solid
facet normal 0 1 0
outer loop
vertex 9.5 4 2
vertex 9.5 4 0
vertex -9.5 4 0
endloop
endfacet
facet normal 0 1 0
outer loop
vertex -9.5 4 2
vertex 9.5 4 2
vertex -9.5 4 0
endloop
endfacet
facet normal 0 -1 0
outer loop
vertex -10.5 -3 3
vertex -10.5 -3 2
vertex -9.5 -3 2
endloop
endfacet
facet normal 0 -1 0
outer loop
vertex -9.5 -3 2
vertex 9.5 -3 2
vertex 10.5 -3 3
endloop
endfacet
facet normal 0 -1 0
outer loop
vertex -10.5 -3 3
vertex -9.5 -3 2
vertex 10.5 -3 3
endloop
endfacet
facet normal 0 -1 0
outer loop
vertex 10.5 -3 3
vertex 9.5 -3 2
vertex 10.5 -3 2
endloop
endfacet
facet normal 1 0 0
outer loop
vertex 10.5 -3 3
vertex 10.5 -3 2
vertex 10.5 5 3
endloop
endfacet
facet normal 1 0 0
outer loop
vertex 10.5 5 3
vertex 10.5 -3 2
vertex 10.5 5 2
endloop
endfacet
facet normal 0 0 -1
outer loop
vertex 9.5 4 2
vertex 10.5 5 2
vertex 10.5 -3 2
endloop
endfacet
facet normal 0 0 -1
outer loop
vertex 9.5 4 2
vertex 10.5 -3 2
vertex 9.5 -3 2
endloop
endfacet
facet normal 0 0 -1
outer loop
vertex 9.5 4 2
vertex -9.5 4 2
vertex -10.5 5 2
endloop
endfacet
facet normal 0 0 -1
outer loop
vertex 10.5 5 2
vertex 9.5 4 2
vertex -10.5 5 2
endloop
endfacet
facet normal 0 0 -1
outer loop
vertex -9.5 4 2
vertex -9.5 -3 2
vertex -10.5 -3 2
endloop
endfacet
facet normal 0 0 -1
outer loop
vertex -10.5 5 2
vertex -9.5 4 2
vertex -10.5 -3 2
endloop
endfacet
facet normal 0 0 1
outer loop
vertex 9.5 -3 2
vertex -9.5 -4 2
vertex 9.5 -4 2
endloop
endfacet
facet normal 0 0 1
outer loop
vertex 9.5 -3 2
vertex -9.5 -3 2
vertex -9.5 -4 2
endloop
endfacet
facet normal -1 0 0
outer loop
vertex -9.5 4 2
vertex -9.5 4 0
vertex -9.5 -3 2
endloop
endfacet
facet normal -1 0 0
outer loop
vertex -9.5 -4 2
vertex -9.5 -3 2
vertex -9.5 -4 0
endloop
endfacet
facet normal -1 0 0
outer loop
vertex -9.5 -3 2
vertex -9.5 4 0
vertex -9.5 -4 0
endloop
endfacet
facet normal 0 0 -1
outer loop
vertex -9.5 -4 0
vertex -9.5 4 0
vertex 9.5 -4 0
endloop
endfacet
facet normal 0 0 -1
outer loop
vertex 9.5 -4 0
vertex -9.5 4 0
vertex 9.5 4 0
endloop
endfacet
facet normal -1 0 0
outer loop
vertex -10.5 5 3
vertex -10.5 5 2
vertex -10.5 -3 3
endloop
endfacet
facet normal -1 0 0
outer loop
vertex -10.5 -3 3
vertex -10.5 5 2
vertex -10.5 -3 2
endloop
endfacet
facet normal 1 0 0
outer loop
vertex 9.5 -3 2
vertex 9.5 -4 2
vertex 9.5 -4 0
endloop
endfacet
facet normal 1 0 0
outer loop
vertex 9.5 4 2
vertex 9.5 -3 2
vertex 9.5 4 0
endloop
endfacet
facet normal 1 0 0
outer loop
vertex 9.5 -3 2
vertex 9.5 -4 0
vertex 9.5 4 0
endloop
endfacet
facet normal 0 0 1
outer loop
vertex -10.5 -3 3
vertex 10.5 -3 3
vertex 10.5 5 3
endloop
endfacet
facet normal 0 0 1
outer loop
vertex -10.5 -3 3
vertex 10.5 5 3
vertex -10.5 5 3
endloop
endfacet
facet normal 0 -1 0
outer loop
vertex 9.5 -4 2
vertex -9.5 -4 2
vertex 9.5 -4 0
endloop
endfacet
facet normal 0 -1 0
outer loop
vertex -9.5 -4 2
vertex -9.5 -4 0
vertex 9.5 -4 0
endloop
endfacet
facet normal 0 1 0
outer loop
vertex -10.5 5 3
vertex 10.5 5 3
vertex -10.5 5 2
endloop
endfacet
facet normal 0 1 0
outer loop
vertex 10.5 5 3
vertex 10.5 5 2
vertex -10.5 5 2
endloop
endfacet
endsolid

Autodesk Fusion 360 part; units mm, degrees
sketch "Sketch1" plane through (0, 0, 0) normal (0, 0, 1) x (1, 0, 0)
  line L0 (9.5, 4) -> (-9.5, 4)
  line L1 (-9.5, 4) -> (-9.5, -4)
  line L2 (-9.5, -4) -> (9.5, -4)
  line L3 (9.5, -4) -> (9.5, 4)
  line L4 (9.5, 4) -> (-9.5, -4) construction
  line L5 (-9.5, 4) -> (9.5, -4) construction
  dimension "d1" = 19
  dimension "d2" = 8
extrude "Extrude1" add sketch "Sketch1" along normal blind 2
sketch "Sketch2" plane through (0, 0, 2) normal (0, 0, 1) x (-1, 0, 0)
  line L0 (-9.5, 4) -> (-9.5, -4)
  line L1 (-9.5, -4) -> (9.5, -4)
  line L2 (9.5, -4) -> (9.5, 4)
  line L3 (9.5, 4) -> (-9.5, 4)
  line L4 (0, 4) -> (0, 3)
  line L5 (0, 3) -> (0, -5)
  line L6 (-10.5, -5) -> (10.5, -5)
  line L7 (10.5, -5) -> (10.5, 3)
  line L8 (10.5, 3) -> (-10.5, 3)
  line L9 (-10.5, 3) -> (-10.5, -5)
  line L10 (-10.5, -5) -> (10.5, 3) construction
  line L11 (10.5, -5) -> (-10.5, 3) construction
  dimension "d5" = 21
extrude "Extrude2" add sketch "Sketch2" along normal blind 1 contours L0 L1 L5 L8 | L0 L1 L5 L6 L8 L9 | L1 L2 L5 L8 | L1 L2 L5 L6 L7 L8
